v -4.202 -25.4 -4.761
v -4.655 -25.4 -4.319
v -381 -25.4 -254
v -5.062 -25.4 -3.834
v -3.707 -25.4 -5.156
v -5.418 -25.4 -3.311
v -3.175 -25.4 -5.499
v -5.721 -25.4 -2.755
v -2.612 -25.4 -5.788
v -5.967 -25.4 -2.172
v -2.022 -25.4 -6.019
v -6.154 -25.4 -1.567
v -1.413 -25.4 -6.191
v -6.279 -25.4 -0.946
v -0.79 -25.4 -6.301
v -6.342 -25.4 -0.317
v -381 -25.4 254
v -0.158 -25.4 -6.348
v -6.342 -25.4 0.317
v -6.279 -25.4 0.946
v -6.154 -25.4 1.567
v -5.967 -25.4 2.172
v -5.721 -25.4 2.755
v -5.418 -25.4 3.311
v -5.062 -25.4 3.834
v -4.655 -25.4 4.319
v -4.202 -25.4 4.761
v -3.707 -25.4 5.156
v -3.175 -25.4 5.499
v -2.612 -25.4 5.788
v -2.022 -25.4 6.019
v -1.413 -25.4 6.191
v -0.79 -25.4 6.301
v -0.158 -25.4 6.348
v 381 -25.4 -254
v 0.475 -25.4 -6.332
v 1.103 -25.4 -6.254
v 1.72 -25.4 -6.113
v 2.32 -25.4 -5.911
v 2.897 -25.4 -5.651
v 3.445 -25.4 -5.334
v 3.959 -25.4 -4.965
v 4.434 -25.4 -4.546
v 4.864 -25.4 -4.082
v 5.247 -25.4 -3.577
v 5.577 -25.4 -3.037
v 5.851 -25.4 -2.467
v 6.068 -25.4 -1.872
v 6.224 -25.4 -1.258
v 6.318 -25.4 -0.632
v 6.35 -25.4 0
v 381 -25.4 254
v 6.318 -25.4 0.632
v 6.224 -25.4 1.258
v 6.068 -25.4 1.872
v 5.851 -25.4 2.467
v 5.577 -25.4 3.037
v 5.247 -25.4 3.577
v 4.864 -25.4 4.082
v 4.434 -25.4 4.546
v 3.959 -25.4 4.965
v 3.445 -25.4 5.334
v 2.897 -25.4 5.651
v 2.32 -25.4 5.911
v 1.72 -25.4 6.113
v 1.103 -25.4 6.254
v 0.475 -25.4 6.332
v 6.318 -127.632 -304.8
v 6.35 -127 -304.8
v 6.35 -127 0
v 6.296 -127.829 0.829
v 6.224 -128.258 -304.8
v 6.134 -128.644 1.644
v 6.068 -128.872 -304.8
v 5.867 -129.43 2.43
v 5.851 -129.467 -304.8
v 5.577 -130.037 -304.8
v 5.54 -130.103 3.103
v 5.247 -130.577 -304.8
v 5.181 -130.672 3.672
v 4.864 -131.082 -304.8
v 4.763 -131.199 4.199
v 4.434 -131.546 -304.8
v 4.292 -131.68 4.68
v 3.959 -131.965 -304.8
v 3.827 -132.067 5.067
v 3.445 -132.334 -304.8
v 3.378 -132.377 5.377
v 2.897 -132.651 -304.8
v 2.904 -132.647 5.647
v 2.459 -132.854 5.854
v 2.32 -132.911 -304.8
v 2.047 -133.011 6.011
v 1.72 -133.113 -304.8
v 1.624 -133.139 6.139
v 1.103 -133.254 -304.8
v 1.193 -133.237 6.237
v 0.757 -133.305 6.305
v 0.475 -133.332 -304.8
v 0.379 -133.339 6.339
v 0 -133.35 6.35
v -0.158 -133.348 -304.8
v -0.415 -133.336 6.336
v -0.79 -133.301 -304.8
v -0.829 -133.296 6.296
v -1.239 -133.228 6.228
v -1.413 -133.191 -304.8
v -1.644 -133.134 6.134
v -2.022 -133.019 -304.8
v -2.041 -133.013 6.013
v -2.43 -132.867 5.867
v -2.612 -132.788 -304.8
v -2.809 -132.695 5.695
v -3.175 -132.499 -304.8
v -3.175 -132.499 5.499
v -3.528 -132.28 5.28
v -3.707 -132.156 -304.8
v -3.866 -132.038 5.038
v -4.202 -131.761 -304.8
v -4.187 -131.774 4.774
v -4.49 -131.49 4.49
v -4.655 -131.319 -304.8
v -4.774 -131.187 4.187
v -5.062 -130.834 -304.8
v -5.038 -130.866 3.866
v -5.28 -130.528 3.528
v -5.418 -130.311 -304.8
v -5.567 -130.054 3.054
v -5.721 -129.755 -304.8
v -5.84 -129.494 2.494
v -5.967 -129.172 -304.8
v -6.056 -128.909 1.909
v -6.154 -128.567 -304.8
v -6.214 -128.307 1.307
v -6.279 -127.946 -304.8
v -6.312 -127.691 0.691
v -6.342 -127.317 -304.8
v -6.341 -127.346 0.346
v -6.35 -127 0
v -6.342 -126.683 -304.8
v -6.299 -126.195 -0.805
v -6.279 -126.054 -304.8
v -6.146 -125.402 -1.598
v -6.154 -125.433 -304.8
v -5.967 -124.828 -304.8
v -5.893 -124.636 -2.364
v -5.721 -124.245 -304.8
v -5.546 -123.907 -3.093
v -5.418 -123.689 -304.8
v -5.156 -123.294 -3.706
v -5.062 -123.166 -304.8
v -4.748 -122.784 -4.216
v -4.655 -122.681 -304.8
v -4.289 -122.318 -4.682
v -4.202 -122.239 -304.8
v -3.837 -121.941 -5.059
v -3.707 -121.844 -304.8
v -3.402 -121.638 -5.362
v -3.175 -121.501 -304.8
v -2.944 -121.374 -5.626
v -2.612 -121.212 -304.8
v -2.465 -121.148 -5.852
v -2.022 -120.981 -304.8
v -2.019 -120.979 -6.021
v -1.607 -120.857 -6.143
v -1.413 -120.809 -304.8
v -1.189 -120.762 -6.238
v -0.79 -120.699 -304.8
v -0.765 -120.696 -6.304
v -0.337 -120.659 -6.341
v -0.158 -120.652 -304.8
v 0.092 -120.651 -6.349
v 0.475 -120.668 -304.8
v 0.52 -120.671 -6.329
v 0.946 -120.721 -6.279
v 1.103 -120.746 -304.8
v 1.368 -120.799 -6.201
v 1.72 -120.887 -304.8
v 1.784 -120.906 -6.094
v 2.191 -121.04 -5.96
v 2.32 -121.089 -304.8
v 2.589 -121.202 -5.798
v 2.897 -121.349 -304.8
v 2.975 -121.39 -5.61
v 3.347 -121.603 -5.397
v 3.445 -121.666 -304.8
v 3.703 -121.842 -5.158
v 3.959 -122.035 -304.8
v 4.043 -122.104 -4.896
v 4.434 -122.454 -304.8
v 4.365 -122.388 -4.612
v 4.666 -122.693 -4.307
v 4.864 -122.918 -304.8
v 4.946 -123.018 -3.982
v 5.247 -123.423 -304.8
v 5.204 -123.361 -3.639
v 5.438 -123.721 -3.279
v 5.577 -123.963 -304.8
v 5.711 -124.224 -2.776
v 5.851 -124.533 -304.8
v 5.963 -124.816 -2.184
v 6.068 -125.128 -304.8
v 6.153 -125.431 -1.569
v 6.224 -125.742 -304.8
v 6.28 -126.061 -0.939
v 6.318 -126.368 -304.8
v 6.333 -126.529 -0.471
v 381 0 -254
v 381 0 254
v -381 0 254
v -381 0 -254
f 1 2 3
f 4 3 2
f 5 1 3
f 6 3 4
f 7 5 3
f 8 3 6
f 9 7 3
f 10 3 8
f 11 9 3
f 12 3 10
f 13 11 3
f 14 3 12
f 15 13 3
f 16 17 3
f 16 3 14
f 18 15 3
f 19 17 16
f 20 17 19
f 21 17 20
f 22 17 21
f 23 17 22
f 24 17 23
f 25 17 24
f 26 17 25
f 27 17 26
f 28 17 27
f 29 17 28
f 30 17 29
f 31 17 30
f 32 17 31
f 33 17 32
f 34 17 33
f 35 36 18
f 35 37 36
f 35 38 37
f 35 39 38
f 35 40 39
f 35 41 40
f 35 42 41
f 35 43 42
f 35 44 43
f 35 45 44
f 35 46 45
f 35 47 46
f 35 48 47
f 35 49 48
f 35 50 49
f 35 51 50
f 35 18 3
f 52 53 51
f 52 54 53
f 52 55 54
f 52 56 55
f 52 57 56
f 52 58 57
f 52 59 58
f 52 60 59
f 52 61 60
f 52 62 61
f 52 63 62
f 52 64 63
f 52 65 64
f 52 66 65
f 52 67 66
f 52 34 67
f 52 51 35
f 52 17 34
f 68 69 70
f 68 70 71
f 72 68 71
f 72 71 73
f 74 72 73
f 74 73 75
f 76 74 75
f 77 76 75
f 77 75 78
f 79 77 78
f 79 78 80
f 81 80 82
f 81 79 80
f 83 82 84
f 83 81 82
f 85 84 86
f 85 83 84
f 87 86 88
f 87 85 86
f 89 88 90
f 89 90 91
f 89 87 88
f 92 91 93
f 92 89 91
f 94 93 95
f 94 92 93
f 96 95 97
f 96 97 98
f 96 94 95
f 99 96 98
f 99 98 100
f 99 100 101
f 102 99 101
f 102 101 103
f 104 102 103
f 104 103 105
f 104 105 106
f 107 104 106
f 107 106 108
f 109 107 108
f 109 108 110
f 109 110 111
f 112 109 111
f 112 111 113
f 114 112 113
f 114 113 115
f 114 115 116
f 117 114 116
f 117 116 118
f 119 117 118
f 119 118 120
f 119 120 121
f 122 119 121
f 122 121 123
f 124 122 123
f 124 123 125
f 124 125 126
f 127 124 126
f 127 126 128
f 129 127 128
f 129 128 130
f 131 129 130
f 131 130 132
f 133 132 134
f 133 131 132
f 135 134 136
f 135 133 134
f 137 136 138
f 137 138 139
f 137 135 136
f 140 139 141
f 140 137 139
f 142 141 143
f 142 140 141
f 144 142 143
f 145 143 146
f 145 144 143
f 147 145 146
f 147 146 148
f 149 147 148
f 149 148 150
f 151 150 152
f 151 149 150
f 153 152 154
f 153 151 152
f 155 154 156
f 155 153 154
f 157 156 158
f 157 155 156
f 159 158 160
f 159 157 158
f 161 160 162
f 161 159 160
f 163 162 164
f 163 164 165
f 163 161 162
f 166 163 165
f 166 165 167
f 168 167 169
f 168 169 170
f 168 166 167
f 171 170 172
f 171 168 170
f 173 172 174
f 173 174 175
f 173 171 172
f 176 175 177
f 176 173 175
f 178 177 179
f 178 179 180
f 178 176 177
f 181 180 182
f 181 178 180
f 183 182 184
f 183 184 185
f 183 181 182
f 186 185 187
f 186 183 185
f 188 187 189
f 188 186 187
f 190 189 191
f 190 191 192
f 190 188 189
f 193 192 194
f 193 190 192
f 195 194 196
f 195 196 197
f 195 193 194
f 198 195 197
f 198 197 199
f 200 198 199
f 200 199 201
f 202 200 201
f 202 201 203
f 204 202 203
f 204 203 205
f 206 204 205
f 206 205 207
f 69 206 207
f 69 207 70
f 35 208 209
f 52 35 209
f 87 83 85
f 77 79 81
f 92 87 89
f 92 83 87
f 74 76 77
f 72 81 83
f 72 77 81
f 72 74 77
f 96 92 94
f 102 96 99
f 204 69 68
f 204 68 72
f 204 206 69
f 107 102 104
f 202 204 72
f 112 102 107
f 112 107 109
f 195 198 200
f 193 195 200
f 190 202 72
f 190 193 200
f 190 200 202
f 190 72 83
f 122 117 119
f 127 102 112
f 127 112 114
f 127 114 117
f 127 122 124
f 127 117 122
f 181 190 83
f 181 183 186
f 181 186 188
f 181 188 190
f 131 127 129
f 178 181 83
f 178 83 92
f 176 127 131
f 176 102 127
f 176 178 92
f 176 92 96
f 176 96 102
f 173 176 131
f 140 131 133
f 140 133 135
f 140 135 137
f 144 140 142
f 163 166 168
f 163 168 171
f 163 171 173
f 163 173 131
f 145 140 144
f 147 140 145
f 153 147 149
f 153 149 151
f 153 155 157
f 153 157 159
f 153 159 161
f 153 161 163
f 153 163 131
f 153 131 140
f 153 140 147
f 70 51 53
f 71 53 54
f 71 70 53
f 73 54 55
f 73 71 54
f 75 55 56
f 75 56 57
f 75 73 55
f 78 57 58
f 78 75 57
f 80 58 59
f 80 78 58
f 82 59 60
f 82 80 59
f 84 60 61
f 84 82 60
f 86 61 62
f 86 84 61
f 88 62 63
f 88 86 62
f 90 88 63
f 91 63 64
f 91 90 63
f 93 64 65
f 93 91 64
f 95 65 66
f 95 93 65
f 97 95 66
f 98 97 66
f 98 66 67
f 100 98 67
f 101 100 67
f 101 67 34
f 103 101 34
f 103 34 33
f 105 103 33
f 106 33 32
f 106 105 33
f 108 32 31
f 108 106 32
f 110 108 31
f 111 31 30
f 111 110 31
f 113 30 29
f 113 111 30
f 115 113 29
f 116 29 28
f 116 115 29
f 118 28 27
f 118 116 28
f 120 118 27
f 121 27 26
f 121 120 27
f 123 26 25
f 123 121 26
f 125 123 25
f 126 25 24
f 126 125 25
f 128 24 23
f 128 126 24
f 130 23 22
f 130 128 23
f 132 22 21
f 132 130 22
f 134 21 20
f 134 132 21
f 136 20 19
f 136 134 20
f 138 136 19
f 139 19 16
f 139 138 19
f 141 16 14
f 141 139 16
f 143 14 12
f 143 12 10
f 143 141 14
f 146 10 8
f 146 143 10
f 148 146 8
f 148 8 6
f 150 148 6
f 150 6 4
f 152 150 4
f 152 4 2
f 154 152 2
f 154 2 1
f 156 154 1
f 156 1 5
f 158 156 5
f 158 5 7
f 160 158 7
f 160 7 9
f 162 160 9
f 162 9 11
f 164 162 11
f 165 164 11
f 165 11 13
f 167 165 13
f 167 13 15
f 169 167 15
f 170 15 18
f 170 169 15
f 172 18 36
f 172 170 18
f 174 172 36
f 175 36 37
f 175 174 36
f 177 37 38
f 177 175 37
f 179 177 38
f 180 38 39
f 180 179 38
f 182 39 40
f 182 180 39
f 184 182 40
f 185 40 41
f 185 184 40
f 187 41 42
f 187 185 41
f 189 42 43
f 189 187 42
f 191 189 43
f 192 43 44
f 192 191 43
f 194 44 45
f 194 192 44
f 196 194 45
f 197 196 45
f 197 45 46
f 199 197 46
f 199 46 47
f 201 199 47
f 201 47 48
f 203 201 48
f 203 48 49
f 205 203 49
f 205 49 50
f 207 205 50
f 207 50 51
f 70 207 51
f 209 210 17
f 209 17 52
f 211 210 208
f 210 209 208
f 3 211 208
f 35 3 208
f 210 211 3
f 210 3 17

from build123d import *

# Parameters (mm, degrees)
F0_W     = 762
F0_H     = 508
F1_DEPTH = 25.4
F3_R     = 6.35


with BuildPart() as f1:
    # F0 (on Front) → F1 (new body)
    with BuildSketch(Plane.XZ):
        Rectangle(F0_W, F0_H)
    extrude(amount=F1_DEPTH)

    # F4: sweep along a path in F2
    with BuildLine(Plane.YZ) as f4_path:
        Line((0, 0), (-127, 0))
        Line((-127, 0), (-127, -304.8))
    # F3 (on Front) → F4 (sweep)
    with BuildSketch(Plane.XZ):
        Circle(F3_R)
    sweep(path=f4_path.line, transition=Transition.RIGHT)


solid = f1.part
